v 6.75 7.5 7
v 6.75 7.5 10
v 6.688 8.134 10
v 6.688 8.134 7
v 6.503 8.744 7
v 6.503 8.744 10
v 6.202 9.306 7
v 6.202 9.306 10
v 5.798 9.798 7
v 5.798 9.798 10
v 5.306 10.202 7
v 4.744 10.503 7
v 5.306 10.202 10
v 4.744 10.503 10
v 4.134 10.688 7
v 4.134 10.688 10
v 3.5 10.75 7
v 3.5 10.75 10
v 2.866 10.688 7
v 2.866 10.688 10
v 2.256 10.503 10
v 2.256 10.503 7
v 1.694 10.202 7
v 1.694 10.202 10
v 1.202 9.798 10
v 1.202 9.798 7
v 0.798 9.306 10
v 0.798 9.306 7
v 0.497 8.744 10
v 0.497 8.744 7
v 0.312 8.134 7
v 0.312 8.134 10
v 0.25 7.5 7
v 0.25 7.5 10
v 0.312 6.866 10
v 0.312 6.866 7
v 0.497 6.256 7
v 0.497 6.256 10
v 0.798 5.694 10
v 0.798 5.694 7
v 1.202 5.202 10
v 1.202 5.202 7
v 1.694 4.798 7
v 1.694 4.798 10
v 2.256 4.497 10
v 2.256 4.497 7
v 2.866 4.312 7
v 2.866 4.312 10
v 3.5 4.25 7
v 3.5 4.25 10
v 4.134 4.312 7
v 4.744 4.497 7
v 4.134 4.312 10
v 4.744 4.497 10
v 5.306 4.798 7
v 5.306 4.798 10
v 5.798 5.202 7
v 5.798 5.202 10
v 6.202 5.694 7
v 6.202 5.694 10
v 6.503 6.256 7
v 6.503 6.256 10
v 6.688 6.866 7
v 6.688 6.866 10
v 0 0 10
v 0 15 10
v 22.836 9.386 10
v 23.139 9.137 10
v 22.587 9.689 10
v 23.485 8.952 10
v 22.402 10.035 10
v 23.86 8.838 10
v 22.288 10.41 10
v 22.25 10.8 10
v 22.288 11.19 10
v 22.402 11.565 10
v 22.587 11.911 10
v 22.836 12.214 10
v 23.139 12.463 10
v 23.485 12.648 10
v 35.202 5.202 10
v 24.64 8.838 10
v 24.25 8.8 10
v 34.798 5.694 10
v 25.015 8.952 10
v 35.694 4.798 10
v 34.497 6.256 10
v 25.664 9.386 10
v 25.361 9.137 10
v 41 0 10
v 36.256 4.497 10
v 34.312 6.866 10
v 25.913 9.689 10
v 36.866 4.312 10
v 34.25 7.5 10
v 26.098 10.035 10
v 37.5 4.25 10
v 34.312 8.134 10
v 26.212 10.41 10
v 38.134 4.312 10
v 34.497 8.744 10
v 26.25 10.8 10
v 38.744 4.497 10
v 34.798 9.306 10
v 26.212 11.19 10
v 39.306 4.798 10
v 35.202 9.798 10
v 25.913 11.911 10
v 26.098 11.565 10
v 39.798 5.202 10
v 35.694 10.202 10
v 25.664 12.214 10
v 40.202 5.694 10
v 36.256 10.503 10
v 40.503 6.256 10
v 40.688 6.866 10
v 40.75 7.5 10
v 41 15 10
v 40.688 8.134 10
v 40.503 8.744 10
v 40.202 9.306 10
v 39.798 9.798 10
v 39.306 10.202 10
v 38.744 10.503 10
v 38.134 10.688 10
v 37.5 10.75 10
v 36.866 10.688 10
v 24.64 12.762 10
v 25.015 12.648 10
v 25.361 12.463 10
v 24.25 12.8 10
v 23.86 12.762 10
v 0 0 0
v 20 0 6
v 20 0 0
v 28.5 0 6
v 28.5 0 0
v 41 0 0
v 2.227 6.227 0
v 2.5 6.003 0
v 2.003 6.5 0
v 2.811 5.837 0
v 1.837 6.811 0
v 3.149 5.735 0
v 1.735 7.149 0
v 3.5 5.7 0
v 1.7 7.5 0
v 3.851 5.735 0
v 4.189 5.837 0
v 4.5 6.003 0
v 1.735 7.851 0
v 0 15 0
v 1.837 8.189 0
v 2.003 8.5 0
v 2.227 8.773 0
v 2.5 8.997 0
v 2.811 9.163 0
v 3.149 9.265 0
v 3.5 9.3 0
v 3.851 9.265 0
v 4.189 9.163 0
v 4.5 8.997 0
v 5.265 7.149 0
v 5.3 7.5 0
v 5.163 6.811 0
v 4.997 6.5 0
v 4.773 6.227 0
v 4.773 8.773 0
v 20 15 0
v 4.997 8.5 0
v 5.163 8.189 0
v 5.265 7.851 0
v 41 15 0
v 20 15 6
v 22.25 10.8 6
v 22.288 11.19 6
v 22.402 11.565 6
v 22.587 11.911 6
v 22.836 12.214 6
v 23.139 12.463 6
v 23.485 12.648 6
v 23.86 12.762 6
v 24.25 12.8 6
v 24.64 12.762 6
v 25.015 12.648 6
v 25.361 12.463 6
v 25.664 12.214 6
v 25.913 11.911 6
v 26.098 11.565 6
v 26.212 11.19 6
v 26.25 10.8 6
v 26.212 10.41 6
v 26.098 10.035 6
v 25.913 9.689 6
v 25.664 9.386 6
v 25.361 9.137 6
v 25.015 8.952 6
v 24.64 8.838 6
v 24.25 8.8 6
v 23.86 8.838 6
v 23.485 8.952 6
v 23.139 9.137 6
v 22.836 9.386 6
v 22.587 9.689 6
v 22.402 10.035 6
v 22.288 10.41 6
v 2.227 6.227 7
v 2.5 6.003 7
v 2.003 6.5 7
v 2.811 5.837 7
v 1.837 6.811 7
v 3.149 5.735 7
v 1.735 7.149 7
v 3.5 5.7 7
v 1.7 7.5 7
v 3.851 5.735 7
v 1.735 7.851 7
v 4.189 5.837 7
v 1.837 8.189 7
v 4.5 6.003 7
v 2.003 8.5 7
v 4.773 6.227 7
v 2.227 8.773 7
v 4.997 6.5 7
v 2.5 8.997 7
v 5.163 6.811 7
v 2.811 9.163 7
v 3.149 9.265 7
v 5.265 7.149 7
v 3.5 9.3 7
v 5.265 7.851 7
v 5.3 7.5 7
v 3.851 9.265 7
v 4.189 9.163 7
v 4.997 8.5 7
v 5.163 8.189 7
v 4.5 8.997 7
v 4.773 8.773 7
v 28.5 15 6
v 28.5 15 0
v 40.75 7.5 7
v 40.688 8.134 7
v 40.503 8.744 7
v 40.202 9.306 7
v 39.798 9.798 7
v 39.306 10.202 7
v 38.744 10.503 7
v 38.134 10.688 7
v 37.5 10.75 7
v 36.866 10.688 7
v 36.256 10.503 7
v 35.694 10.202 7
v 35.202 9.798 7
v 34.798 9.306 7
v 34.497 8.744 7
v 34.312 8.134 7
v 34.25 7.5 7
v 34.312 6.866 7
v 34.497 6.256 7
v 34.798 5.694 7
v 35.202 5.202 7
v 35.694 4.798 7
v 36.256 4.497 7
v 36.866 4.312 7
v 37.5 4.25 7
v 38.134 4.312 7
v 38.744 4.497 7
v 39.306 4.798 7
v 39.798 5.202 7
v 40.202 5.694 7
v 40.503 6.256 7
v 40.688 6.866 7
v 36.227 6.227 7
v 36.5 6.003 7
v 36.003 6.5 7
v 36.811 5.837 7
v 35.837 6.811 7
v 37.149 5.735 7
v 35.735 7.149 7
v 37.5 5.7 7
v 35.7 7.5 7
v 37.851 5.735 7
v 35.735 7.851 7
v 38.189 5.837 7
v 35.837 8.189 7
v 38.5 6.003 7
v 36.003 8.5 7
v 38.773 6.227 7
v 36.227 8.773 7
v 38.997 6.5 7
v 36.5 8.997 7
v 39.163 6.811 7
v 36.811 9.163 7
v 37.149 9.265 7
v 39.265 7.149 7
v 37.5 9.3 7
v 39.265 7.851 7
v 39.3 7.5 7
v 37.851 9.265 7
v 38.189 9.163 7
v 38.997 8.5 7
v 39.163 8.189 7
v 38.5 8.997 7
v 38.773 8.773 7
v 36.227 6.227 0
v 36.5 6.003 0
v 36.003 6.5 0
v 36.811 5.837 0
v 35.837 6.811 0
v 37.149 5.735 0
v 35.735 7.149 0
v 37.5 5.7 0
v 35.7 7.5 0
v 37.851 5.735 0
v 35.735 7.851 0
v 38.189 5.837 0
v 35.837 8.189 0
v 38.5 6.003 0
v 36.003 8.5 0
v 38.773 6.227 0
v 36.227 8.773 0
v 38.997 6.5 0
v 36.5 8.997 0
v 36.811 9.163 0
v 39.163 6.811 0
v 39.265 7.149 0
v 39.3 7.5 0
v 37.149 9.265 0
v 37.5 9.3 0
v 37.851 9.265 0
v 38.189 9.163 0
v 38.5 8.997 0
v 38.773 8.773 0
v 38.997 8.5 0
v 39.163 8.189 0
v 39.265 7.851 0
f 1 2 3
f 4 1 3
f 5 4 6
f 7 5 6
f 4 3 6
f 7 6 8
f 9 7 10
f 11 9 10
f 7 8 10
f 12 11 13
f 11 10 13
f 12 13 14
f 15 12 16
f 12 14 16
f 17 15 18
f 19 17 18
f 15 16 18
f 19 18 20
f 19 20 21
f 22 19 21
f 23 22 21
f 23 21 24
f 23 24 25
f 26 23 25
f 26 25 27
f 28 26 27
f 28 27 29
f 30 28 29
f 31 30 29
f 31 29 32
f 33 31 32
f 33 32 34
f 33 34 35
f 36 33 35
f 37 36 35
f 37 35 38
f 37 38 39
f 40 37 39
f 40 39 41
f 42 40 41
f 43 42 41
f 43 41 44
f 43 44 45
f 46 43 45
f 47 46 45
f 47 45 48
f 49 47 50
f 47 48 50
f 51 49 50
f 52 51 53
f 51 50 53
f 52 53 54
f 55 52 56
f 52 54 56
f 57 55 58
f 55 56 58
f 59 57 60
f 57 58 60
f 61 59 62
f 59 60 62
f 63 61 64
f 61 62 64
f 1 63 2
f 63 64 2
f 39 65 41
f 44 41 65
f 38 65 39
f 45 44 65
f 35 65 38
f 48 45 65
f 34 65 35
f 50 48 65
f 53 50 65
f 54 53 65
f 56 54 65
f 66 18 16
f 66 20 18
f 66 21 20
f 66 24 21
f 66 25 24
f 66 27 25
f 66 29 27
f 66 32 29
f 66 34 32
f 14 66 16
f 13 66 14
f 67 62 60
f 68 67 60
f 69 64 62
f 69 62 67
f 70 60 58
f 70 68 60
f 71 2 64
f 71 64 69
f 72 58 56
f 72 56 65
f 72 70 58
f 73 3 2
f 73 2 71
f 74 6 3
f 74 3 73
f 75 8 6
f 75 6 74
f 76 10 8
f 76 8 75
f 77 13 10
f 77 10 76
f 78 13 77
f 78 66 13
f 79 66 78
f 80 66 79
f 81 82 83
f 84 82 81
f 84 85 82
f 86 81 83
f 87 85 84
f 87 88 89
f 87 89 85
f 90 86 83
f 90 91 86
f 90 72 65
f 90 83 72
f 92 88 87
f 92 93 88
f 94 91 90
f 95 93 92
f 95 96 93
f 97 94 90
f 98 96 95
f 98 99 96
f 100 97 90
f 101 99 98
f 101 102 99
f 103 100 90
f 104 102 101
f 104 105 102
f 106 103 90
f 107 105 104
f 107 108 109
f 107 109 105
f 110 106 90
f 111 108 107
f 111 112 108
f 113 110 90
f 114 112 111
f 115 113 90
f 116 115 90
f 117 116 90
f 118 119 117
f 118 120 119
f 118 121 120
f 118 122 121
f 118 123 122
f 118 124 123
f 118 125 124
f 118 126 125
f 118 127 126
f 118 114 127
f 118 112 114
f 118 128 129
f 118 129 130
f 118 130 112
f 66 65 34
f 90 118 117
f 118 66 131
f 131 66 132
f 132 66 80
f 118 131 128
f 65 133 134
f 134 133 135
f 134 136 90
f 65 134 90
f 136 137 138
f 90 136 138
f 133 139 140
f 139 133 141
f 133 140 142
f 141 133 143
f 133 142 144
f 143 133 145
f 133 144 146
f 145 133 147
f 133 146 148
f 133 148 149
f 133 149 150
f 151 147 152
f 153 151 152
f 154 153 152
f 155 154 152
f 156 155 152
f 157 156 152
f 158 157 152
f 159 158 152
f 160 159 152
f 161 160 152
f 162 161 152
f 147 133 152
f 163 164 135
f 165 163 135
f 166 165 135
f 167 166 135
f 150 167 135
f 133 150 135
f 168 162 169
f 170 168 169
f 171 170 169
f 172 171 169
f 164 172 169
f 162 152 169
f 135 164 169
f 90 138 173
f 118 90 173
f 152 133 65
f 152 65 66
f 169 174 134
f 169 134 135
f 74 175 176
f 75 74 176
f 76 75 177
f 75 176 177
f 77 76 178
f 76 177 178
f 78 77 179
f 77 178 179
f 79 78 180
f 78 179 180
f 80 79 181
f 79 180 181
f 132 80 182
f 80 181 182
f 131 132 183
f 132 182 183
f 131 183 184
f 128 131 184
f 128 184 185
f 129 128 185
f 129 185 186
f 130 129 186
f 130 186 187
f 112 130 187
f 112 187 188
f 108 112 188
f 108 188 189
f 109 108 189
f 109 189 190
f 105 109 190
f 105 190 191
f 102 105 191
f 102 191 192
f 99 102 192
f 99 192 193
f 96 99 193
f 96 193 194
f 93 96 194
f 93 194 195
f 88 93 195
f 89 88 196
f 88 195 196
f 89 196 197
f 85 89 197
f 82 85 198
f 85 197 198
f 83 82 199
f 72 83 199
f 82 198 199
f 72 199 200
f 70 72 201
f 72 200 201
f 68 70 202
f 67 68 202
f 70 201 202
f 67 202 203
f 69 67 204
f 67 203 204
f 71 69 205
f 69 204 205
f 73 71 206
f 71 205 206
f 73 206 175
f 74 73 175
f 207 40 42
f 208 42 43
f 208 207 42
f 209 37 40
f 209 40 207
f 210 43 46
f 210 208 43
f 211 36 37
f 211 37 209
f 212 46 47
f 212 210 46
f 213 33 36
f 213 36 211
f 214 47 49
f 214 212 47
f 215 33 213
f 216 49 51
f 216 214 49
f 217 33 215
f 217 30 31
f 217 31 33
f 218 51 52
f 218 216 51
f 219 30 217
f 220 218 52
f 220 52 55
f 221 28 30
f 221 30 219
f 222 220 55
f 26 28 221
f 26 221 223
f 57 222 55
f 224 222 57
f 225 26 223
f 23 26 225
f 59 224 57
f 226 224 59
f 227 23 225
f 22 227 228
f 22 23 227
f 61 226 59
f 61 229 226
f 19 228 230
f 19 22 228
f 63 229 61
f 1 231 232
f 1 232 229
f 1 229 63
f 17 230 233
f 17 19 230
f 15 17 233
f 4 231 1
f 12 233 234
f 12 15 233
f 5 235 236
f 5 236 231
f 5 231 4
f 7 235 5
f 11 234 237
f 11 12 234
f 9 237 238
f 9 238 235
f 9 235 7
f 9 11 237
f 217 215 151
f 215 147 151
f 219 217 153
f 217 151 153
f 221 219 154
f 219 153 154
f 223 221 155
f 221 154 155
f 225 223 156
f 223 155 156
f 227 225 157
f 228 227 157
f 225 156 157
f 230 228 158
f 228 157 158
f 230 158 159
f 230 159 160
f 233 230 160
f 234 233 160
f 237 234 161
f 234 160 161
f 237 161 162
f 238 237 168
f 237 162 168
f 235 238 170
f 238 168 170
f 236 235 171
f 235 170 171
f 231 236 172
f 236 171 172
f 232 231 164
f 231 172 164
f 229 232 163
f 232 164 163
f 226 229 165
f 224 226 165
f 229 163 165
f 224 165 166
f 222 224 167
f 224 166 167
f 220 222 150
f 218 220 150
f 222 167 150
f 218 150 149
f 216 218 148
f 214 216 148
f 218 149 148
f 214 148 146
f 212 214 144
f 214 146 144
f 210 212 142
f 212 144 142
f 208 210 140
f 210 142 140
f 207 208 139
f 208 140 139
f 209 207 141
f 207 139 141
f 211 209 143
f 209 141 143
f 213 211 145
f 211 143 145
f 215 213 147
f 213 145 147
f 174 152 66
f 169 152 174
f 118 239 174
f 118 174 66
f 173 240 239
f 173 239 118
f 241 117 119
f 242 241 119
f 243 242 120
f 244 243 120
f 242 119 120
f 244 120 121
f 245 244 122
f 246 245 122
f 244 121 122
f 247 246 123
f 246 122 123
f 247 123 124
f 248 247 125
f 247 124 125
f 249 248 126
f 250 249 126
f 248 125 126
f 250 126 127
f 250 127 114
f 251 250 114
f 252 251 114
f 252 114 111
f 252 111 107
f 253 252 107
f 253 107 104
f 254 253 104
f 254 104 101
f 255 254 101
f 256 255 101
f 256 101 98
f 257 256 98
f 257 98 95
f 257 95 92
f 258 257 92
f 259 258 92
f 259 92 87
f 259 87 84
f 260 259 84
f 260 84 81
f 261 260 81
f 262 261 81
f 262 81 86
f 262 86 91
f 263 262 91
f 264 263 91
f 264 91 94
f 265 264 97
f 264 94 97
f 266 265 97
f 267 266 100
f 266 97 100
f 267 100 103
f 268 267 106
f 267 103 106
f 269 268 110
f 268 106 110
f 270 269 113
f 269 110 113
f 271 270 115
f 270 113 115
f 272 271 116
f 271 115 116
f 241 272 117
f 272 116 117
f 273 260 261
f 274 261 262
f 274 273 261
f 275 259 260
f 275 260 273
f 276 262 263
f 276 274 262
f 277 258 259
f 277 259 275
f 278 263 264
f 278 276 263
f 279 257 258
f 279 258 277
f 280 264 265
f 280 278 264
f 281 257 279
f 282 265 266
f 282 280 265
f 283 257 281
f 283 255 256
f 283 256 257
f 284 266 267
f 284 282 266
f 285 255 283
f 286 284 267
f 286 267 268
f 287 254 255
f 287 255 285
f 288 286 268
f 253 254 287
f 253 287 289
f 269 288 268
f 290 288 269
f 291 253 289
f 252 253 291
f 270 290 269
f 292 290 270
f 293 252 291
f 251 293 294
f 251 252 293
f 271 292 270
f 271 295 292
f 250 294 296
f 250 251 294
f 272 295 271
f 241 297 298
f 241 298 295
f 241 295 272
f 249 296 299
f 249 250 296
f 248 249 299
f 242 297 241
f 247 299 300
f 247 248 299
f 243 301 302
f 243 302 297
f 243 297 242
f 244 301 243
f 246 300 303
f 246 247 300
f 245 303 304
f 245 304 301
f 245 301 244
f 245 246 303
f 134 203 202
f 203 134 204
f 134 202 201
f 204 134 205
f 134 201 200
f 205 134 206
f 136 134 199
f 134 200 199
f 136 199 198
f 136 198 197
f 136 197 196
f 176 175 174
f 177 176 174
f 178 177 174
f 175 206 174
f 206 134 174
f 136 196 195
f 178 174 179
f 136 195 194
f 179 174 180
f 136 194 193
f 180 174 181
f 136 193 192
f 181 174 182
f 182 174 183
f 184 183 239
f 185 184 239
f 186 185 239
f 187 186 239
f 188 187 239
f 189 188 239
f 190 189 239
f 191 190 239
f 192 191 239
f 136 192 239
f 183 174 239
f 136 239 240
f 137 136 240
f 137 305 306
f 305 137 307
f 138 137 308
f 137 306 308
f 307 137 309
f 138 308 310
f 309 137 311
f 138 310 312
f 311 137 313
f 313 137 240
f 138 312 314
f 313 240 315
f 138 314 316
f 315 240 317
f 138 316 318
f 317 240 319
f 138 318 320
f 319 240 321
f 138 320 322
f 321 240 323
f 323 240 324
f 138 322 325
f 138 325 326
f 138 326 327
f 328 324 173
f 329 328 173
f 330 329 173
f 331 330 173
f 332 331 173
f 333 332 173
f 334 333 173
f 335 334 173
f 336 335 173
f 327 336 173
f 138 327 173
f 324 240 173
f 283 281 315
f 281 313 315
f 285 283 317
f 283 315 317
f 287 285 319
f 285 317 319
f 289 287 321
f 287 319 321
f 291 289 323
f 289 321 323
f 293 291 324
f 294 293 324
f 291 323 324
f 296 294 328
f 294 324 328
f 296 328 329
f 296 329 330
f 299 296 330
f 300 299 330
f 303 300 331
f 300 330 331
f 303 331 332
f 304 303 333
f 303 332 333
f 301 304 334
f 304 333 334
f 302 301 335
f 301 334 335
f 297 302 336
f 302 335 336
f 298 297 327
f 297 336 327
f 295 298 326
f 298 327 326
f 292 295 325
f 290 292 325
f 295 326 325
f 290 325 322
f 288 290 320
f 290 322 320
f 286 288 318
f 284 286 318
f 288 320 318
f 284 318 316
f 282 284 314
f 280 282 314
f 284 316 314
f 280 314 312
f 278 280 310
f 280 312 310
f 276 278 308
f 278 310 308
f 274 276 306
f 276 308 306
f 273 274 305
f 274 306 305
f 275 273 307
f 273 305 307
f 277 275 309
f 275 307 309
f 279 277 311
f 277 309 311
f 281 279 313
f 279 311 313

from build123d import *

# Parameters (mm, degrees)
SKETCH_1_W                   = 41
SKETCH_1_H                   = 15
EXTRUDE_1_DEPTH              = 10
HOLE_WIZARD_M3_1_D           = 3.6
HOLE_WIZARD_M3_1_CBORE_D     = 6.5
HOLE_WIZARD_M3_1_CBORE_DEPTH = 3
SKETCH_4_W                   = 8.5
SKETCH_4_H                   = 6
CUT_EXTRUDE_1_DEPTH          = 45.788391353
SKETCH_5_R                   = 2
CUT_EXTRUDE_2_DEPTH          = 10


with BuildPart() as part:
    # 草图1 → 凸台-拉伸1 (new body)
    with BuildSketch(Plane.XY):
        with Locations((20.5, 7.5)):
            Rectangle(SKETCH_1_W, SKETCH_1_H)
    extrude(amount=EXTRUDE_1_DEPTH)

    # M3 六角凹头螺钉的柱形沉头孔1 (through all)
    with Locations(Plane.XY.offset(10)):
        with Locations((3.5, 7.5), (37.5, 7.5)):
            CounterBoreHole(HOLE_WIZARD_M3_1_D / 2, HOLE_WIZARD_M3_1_CBORE_D / 2, HOLE_WIZARD_M3_1_CBORE_DEPTH)

    # 草图4 → 切除-拉伸1 (cut, through all)
    with BuildSketch(Plane(origin=(0, 15, 0), x_dir=(1, 0, 0), z_dir=(0, 1, 0))):
        with Locations((24.25, -3)):
            Rectangle(SKETCH_4_W, SKETCH_4_H)
    extrude(amount=-CUT_EXTRUDE_1_DEPTH, mode=Mode.SUBTRACT)

    # 草图5 → 切除-拉伸2 (cut)
    with BuildSketch(Plane(origin=(0, 0, 6), x_dir=(-1, 0, 0), z_dir=(0, 0, -1))):
        with Locations((-24.25, 10.8)):
            Circle(SKETCH_5_R)
    extrude(amount=-CUT_EXTRUDE_2_DEPTH, mode=Mode.SUBTRACT)


solid = part.part
